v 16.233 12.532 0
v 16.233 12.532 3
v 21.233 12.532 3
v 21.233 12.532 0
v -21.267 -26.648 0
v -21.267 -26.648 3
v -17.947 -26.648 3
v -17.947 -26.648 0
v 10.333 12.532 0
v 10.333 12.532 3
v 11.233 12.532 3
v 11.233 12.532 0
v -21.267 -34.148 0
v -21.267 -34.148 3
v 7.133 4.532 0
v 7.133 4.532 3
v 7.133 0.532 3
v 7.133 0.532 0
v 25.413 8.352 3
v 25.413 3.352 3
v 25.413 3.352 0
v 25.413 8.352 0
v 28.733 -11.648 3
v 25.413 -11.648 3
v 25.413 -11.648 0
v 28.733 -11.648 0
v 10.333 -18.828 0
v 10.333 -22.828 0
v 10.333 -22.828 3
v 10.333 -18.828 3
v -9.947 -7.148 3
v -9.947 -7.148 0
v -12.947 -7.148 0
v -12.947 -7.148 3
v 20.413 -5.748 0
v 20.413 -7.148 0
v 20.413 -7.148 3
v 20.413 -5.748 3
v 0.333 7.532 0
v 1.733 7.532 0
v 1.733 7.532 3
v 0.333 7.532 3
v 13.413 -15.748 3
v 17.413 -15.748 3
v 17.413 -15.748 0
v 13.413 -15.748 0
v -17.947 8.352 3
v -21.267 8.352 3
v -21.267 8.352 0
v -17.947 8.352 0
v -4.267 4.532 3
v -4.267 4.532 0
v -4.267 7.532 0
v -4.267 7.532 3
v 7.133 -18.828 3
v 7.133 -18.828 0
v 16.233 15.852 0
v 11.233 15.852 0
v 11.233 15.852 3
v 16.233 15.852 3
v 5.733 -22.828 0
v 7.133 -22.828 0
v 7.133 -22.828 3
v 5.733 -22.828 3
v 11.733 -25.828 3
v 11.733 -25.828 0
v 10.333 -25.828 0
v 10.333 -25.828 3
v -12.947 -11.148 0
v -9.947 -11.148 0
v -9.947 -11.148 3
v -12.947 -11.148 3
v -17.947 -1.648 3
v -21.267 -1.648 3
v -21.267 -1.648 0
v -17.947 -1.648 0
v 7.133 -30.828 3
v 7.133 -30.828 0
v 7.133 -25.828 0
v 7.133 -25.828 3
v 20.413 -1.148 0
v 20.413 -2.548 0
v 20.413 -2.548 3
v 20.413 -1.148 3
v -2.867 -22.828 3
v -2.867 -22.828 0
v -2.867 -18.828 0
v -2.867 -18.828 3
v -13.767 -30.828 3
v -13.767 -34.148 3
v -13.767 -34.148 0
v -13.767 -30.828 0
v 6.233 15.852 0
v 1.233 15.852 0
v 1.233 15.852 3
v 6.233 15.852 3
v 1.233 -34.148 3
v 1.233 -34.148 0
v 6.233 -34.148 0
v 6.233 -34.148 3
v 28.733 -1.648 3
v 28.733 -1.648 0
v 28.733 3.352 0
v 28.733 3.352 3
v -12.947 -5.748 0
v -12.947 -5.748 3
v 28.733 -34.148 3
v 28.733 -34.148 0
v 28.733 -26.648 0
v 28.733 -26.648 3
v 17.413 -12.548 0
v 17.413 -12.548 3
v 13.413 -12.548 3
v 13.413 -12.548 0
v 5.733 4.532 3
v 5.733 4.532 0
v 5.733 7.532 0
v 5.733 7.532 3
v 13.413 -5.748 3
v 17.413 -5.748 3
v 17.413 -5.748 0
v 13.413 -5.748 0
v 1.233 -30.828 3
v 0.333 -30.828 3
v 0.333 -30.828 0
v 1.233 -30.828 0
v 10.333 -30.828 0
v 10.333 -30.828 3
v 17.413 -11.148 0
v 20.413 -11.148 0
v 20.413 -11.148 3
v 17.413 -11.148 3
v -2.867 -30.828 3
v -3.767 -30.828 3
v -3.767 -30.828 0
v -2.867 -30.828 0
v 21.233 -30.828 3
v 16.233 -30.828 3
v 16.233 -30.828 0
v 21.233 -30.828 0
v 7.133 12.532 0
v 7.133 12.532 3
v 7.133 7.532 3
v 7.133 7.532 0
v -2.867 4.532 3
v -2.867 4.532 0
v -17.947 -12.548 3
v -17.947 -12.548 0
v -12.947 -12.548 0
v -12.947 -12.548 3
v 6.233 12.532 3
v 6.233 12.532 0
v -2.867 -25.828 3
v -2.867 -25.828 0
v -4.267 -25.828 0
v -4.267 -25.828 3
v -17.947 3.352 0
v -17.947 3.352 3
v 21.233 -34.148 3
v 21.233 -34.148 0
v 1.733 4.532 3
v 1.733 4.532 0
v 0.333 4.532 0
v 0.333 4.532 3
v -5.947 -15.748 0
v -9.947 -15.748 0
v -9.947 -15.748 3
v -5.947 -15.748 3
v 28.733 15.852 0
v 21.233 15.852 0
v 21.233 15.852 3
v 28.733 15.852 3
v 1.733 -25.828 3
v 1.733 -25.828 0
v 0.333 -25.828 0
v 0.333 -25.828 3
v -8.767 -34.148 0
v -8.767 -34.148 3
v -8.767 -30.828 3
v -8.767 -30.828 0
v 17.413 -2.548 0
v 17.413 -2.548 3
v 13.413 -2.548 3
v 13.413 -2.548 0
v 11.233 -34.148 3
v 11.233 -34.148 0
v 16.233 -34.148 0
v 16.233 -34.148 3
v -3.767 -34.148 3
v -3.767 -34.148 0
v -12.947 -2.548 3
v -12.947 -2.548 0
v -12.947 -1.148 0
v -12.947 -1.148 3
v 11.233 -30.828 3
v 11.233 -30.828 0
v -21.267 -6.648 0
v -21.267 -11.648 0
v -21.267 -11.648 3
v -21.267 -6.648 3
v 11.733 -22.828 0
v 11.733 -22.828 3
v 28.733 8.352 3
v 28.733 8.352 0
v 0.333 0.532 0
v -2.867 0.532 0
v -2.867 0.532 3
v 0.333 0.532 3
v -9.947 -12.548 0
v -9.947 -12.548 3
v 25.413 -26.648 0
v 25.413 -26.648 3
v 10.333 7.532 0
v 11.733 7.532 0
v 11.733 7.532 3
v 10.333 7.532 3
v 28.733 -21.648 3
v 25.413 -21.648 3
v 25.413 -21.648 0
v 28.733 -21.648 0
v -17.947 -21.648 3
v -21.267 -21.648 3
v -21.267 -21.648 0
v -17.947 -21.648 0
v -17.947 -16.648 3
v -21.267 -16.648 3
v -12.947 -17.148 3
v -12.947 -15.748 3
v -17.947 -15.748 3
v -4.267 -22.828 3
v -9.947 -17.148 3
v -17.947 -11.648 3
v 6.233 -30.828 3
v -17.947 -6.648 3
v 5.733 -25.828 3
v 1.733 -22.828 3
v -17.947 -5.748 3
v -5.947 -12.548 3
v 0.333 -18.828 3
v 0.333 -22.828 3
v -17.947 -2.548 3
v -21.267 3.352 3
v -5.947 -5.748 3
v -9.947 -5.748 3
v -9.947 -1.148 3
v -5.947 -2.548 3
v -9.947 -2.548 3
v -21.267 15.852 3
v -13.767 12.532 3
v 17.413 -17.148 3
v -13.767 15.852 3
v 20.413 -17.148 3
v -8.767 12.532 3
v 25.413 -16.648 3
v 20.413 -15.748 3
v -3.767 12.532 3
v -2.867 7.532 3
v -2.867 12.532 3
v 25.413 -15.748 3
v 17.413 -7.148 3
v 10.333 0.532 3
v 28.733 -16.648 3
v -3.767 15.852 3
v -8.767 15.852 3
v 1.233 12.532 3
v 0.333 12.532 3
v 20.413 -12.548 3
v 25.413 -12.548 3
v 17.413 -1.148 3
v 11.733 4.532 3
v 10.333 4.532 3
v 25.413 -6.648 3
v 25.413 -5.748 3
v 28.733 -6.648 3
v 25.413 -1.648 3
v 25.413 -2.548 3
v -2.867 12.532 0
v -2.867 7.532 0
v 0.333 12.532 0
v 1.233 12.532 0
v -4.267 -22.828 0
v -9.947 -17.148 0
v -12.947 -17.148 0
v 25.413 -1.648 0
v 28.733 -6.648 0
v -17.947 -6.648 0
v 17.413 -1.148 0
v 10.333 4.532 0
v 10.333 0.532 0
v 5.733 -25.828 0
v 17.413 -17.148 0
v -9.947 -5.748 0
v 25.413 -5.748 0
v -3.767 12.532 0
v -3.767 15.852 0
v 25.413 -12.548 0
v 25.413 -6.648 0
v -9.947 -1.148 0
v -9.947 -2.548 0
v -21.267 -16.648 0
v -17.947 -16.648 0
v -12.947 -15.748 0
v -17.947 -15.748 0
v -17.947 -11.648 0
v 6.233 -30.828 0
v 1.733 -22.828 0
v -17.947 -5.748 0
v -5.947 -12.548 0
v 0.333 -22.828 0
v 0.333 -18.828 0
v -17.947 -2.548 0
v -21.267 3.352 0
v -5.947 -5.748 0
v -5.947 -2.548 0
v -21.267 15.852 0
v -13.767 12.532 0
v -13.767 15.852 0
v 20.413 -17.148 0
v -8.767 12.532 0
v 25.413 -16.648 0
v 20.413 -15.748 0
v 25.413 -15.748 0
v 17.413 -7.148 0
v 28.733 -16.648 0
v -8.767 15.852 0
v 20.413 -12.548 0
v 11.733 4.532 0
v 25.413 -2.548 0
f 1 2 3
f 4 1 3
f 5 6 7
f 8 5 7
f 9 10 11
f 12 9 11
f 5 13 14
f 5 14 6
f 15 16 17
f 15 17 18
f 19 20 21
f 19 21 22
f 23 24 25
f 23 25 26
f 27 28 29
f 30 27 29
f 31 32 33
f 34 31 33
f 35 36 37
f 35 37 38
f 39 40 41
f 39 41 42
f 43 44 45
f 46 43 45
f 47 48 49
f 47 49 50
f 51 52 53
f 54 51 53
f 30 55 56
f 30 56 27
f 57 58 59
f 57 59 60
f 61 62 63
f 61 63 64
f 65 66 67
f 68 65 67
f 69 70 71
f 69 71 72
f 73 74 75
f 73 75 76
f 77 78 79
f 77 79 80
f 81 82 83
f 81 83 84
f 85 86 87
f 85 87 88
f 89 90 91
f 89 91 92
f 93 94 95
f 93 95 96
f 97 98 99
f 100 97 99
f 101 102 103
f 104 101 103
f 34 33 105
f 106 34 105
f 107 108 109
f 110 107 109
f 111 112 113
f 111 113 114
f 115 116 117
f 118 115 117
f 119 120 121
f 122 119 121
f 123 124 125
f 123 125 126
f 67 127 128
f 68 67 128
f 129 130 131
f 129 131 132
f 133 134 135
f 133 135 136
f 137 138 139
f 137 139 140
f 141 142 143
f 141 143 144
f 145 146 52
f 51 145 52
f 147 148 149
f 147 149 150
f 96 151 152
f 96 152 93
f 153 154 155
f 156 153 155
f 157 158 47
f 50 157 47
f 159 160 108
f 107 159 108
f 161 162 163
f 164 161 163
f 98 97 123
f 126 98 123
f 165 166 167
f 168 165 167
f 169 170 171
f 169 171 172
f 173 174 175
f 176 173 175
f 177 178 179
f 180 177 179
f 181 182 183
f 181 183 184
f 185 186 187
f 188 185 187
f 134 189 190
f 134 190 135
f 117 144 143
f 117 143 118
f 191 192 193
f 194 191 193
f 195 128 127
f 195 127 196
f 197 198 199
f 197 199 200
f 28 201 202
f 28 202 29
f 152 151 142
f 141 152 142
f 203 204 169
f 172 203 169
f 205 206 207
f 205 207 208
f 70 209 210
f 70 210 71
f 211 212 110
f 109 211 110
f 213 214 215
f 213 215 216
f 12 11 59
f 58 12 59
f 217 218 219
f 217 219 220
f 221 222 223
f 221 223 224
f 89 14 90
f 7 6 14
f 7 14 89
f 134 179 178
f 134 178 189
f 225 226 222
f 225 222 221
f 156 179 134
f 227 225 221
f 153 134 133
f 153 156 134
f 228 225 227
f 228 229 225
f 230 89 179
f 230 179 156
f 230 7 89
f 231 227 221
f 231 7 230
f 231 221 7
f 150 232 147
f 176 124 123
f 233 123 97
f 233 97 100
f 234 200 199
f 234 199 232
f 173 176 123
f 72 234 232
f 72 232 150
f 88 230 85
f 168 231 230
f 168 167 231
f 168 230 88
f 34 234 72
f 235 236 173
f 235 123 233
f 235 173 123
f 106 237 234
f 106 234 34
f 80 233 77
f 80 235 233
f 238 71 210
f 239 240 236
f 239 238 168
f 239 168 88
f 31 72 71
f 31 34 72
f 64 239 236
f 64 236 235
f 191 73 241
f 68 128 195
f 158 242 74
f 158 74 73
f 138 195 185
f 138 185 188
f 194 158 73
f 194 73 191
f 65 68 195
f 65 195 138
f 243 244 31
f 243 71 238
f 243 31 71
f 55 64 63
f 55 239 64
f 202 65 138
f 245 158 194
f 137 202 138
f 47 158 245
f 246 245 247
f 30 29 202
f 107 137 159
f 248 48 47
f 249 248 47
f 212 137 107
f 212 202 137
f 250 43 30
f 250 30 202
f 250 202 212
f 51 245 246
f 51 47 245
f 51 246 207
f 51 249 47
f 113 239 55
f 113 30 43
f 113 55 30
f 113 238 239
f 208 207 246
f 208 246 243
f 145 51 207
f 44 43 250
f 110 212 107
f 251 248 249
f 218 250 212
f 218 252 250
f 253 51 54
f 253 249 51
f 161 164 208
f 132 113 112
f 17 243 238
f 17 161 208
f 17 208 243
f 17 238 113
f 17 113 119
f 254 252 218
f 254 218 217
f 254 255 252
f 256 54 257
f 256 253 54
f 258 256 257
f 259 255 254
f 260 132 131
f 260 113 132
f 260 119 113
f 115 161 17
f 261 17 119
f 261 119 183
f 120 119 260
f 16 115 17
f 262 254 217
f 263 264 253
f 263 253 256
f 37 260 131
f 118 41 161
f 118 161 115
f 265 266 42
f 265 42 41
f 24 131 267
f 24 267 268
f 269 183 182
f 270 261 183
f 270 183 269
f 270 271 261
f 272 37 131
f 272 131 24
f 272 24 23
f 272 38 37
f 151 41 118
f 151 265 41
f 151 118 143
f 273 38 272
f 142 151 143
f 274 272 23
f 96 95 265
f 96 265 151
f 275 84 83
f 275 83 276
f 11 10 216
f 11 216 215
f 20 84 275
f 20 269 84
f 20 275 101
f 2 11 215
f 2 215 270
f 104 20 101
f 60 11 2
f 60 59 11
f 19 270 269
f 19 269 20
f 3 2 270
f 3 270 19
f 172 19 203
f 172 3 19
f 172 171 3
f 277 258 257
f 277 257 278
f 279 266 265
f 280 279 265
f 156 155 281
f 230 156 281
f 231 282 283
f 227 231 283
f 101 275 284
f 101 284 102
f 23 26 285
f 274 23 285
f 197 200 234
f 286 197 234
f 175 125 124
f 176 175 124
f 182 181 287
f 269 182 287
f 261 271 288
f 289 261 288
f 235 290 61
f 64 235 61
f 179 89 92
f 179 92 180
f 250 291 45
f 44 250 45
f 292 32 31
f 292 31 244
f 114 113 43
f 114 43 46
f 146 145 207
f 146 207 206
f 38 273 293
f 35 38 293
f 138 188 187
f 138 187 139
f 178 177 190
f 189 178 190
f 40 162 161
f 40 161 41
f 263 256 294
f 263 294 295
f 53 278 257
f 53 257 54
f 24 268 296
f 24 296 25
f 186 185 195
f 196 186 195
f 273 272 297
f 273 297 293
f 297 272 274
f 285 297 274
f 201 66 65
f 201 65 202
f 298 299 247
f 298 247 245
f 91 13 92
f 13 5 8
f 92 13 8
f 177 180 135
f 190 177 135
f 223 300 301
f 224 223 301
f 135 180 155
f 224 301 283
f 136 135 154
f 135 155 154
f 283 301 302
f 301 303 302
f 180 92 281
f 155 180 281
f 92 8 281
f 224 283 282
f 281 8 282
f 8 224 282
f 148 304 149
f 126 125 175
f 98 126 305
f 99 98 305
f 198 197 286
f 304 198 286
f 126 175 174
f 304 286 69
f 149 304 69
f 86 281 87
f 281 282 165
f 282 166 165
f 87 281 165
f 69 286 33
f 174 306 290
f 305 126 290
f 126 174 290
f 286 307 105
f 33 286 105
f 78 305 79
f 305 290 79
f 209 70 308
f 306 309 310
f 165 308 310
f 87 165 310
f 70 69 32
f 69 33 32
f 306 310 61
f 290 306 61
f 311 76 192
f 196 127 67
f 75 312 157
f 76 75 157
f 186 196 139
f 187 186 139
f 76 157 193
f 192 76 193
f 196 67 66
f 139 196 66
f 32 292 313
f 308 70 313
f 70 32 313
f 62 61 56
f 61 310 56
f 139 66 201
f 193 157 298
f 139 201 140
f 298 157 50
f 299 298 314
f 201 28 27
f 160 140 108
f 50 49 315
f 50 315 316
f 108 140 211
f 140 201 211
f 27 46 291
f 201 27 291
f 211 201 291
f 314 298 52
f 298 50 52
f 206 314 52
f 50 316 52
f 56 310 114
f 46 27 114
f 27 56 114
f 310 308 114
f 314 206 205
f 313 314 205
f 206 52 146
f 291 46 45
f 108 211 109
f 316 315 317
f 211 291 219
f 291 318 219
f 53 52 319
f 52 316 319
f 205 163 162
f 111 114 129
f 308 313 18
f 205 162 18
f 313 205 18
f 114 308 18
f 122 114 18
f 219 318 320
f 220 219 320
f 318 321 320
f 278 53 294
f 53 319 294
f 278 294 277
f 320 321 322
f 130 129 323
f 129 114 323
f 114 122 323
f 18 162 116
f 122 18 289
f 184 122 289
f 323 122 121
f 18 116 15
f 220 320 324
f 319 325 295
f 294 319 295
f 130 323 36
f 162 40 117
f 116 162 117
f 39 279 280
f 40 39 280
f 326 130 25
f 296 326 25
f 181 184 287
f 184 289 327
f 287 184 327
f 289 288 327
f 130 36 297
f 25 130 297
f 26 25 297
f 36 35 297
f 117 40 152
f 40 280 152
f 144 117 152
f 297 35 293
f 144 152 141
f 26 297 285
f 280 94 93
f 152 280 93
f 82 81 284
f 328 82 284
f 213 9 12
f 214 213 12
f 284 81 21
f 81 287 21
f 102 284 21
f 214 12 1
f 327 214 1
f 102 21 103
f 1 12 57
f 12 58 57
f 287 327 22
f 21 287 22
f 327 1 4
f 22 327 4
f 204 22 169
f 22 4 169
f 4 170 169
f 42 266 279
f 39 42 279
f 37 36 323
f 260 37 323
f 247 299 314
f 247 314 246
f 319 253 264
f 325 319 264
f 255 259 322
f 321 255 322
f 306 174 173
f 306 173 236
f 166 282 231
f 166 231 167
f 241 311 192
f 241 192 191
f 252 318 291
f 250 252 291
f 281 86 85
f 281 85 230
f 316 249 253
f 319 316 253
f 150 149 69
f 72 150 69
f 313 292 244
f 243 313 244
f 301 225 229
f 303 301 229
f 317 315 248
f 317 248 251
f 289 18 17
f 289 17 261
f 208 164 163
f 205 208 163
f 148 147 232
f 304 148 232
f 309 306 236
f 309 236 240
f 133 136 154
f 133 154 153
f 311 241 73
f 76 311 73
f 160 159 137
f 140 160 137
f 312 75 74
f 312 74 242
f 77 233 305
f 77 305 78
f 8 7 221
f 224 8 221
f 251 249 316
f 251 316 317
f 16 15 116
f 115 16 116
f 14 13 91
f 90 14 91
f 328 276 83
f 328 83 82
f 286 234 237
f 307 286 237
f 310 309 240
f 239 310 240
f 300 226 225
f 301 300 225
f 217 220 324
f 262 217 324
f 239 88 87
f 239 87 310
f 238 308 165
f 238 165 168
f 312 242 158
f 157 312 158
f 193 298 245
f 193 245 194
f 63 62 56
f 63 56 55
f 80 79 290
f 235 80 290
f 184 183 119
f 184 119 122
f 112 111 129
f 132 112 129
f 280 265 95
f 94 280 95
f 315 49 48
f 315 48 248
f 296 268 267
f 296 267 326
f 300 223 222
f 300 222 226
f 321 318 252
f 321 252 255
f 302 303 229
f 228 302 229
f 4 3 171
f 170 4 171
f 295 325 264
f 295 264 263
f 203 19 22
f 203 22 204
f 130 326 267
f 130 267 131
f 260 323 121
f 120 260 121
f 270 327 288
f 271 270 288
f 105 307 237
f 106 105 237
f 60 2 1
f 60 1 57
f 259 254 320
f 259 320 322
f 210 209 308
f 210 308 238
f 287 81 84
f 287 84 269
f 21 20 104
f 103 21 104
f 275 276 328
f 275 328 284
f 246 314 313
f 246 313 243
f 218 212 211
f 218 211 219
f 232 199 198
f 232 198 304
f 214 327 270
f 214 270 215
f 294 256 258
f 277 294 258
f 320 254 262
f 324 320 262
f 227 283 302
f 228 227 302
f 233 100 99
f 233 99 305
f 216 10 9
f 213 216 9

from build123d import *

# Parameters (mm, degrees)
SKETCH1_W           = 50
SKETCH1_H           = 50
BOSS_EXTRUDE1_DEPTH = 3
SKETCH2_W           = 5
SKETCH2_H           = 3.320363524
SKETCH2_W_2         = 3.320363524
SKETCH2_H_2         = 5
CUT_EXTRUDE1_DEPTH  = 3
SKETCH4_W           = 3.2
SKETCH4_H           = 3
CUT_EXTRUDE2_DEPTH  = 12
SKETCH5_W           = 3
SKETCH5_H           = 3.2
CUT_EXTRUDE3_DEPTH  = 12
SKETCH6_W           = 3.2
SKETCH6_H           = 3
CUT_EXTRUDE4_DEPTH  = 12
SKETCH8_W           = 3
SKETCH8_H           = 3.2
CUT_EXTRUDE5_DEPTH  = 12
SKETCH9_W           = 6
SKETCH9_H           = 3
SKETCH9_W_2         = 3
SKETCH9_H_2         = 6
CUT_EXTRUDE6_DEPTH  = 12


with BuildPart() as part:
    # Sketch1 → Boss-Extrude1 (new body)
    with BuildSketch(Plane.XY):
        with Locations((3.733082315, -9.148044693)):
            Rectangle(SKETCH1_W, SKETCH1_H)
    extrude(amount=BOSS_EXTRUDE1_DEPTH)

    # Sketch2 → Cut-Extrude1 (cut)
    with BuildSketch(Plane.XY.offset(3)):
        with Locations((-11.266917685, 14.191773545)):
            Rectangle(SKETCH2_W, SKETCH2_H)
        with Locations((8.733082315, 14.191773545)):
            Rectangle(SKETCH2_W, SKETCH2_H)
        with Locations((-1.266917685, 14.191773545)):
            Rectangle(SKETCH2_W, SKETCH2_H)
        with Locations((18.733082315, 14.191773545)):
            Rectangle(SKETCH2_W, SKETCH2_H)
        with Locations((27.072900553, 5.851955307)):
            Rectangle(SKETCH2_W_2, SKETCH2_H_2)
        with Locations((27.072900553, -4.148044693)):
            Rectangle(SKETCH2_W_2, SKETCH2_H_2)
        with Locations((27.072900553, -14.148044693)):
            Rectangle(SKETCH2_W_2, SKETCH2_H_2)
        with Locations((27.072900553, -24.148044693)):
            Rectangle(SKETCH2_W_2, SKETCH2_H_2)
        with Locations((18.733082315, -32.487862931)):
            Rectangle(SKETCH2_W, SKETCH2_H)
        with Locations((8.733082315, -32.487862931)):
            Rectangle(SKETCH2_W, SKETCH2_H)
        with Locations((-1.266917685, -32.487862931)):
            Rectangle(SKETCH2_W, SKETCH2_H)
        with Locations((-11.266917685, -32.487862931)):
            Rectangle(SKETCH2_W, SKETCH2_H)
        with Locations((-19.606735923, -24.148044693)):
            Rectangle(SKETCH2_W_2, SKETCH2_H_2)
        with Locations((-19.606735923, -14.148044693)):
            Rectangle(SKETCH2_W_2, SKETCH2_H_2)
        with Locations((-19.606735923, -4.148044693)):
            Rectangle(SKETCH2_W_2, SKETCH2_H_2)
        with Locations((-19.606735923, 5.851955307)):
            Rectangle(SKETCH2_W_2, SKETCH2_H_2)
    extrude(amount=-CUT_EXTRUDE1_DEPTH, mode=Mode.SUBTRACT)

    # Sketch4 → Cut-Extrude2 (cut)
    with BuildSketch(Plane(origin=(0, 12.531591783, 0), x_dir=(1, 0, 0), z_dir=(0, 1, 0))):
        with Locations((-1.266917685, -1.5)):
            Rectangle(SKETCH4_W, SKETCH4_H)
        with Locations((8.733082315, -1.5)):
            Rectangle(SKETCH4_W, SKETCH4_H)
    extrude(amount=-CUT_EXTRUDE2_DEPTH, mode=Mode.SUBTRACT)

    # Sketch5 → Cut-Extrude3 (cut)
    with BuildSketch(Plane(origin=(25.412718791, 0, 0), x_dir=(0, 0, -1), z_dir=(1, 0, 0))):
        with Locations((-1.5, -4.148044693)):
            Rectangle(SKETCH5_W, SKETCH5_H)
        with Locations((-1.5, -14.148044693)):
            Rectangle(SKETCH5_W, SKETCH5_H)
    extrude(amount=-CUT_EXTRUDE3_DEPTH, mode=Mode.SUBTRACT)

    # Sketch6 → Cut-Extrude4 (cut)
    with BuildSketch(Plane.XZ.offset(30.827681169)):
        with Locations((-1.266917685, 1.5)):
            Rectangle(SKETCH6_W, SKETCH6_H)
        with Locations((8.733082315, 1.5)):
            Rectangle(SKETCH6_W, SKETCH6_H)
    extrude(amount=-CUT_EXTRUDE4_DEPTH, mode=Mode.SUBTRACT)

    # Sketch8 → Cut-Extrude5 (cut)
    with BuildSketch(Plane.ZY.offset(17.946554161)):
        with Locations((1.5, -14.148044693)):
            Rectangle(SKETCH8_W, SKETCH8_H)
        with Locations((1.5, -4.148044693)):
            Rectangle(SKETCH8_W, SKETCH8_H)
    extrude(amount=-CUT_EXTRUDE5_DEPTH, mode=Mode.SUBTRACT)

    # Sketch9 → Cut-Extrude6 (cut)
    with BuildSketch(Plane(origin=(0, 0, 0), x_dir=(-1, 0, 0), z_dir=(0, 0, -1))):
        with Locations((-8.733082315, -24.327681169)):
            Rectangle(SKETCH9_W, SKETCH9_H)
        with Locations((1.266917685, -24.327681169)):
            Rectangle(SKETCH9_W, SKETCH9_H)
        with Locations((-18.912718791, -4.148044693)):
            Rectangle(SKETCH9_W_2, SKETCH9_H_2)
        with Locations((-18.912718791, -14.148044693)):
            Rectangle(SKETCH9_W_2, SKETCH9_H_2)
        with Locations((1.266917685, 6.031591783)):
            Rectangle(SKETCH9_W, SKETCH9_H)
        with Locations((-8.733082315, 6.031591783)):
            Rectangle(SKETCH9_W, SKETCH9_H)
        with Locations((11.446554161, -14.148044693)):
            Rectangle(SKETCH9_W_2, SKETCH9_H_2)
        with Locations((11.446554161, -4.148044693)):
            Rectangle(SKETCH9_W_2, SKETCH9_H_2)
    extrude(amount=-CUT_EXTRUDE6_DEPTH, mode=Mode.SUBTRACT)


solid = part.part
